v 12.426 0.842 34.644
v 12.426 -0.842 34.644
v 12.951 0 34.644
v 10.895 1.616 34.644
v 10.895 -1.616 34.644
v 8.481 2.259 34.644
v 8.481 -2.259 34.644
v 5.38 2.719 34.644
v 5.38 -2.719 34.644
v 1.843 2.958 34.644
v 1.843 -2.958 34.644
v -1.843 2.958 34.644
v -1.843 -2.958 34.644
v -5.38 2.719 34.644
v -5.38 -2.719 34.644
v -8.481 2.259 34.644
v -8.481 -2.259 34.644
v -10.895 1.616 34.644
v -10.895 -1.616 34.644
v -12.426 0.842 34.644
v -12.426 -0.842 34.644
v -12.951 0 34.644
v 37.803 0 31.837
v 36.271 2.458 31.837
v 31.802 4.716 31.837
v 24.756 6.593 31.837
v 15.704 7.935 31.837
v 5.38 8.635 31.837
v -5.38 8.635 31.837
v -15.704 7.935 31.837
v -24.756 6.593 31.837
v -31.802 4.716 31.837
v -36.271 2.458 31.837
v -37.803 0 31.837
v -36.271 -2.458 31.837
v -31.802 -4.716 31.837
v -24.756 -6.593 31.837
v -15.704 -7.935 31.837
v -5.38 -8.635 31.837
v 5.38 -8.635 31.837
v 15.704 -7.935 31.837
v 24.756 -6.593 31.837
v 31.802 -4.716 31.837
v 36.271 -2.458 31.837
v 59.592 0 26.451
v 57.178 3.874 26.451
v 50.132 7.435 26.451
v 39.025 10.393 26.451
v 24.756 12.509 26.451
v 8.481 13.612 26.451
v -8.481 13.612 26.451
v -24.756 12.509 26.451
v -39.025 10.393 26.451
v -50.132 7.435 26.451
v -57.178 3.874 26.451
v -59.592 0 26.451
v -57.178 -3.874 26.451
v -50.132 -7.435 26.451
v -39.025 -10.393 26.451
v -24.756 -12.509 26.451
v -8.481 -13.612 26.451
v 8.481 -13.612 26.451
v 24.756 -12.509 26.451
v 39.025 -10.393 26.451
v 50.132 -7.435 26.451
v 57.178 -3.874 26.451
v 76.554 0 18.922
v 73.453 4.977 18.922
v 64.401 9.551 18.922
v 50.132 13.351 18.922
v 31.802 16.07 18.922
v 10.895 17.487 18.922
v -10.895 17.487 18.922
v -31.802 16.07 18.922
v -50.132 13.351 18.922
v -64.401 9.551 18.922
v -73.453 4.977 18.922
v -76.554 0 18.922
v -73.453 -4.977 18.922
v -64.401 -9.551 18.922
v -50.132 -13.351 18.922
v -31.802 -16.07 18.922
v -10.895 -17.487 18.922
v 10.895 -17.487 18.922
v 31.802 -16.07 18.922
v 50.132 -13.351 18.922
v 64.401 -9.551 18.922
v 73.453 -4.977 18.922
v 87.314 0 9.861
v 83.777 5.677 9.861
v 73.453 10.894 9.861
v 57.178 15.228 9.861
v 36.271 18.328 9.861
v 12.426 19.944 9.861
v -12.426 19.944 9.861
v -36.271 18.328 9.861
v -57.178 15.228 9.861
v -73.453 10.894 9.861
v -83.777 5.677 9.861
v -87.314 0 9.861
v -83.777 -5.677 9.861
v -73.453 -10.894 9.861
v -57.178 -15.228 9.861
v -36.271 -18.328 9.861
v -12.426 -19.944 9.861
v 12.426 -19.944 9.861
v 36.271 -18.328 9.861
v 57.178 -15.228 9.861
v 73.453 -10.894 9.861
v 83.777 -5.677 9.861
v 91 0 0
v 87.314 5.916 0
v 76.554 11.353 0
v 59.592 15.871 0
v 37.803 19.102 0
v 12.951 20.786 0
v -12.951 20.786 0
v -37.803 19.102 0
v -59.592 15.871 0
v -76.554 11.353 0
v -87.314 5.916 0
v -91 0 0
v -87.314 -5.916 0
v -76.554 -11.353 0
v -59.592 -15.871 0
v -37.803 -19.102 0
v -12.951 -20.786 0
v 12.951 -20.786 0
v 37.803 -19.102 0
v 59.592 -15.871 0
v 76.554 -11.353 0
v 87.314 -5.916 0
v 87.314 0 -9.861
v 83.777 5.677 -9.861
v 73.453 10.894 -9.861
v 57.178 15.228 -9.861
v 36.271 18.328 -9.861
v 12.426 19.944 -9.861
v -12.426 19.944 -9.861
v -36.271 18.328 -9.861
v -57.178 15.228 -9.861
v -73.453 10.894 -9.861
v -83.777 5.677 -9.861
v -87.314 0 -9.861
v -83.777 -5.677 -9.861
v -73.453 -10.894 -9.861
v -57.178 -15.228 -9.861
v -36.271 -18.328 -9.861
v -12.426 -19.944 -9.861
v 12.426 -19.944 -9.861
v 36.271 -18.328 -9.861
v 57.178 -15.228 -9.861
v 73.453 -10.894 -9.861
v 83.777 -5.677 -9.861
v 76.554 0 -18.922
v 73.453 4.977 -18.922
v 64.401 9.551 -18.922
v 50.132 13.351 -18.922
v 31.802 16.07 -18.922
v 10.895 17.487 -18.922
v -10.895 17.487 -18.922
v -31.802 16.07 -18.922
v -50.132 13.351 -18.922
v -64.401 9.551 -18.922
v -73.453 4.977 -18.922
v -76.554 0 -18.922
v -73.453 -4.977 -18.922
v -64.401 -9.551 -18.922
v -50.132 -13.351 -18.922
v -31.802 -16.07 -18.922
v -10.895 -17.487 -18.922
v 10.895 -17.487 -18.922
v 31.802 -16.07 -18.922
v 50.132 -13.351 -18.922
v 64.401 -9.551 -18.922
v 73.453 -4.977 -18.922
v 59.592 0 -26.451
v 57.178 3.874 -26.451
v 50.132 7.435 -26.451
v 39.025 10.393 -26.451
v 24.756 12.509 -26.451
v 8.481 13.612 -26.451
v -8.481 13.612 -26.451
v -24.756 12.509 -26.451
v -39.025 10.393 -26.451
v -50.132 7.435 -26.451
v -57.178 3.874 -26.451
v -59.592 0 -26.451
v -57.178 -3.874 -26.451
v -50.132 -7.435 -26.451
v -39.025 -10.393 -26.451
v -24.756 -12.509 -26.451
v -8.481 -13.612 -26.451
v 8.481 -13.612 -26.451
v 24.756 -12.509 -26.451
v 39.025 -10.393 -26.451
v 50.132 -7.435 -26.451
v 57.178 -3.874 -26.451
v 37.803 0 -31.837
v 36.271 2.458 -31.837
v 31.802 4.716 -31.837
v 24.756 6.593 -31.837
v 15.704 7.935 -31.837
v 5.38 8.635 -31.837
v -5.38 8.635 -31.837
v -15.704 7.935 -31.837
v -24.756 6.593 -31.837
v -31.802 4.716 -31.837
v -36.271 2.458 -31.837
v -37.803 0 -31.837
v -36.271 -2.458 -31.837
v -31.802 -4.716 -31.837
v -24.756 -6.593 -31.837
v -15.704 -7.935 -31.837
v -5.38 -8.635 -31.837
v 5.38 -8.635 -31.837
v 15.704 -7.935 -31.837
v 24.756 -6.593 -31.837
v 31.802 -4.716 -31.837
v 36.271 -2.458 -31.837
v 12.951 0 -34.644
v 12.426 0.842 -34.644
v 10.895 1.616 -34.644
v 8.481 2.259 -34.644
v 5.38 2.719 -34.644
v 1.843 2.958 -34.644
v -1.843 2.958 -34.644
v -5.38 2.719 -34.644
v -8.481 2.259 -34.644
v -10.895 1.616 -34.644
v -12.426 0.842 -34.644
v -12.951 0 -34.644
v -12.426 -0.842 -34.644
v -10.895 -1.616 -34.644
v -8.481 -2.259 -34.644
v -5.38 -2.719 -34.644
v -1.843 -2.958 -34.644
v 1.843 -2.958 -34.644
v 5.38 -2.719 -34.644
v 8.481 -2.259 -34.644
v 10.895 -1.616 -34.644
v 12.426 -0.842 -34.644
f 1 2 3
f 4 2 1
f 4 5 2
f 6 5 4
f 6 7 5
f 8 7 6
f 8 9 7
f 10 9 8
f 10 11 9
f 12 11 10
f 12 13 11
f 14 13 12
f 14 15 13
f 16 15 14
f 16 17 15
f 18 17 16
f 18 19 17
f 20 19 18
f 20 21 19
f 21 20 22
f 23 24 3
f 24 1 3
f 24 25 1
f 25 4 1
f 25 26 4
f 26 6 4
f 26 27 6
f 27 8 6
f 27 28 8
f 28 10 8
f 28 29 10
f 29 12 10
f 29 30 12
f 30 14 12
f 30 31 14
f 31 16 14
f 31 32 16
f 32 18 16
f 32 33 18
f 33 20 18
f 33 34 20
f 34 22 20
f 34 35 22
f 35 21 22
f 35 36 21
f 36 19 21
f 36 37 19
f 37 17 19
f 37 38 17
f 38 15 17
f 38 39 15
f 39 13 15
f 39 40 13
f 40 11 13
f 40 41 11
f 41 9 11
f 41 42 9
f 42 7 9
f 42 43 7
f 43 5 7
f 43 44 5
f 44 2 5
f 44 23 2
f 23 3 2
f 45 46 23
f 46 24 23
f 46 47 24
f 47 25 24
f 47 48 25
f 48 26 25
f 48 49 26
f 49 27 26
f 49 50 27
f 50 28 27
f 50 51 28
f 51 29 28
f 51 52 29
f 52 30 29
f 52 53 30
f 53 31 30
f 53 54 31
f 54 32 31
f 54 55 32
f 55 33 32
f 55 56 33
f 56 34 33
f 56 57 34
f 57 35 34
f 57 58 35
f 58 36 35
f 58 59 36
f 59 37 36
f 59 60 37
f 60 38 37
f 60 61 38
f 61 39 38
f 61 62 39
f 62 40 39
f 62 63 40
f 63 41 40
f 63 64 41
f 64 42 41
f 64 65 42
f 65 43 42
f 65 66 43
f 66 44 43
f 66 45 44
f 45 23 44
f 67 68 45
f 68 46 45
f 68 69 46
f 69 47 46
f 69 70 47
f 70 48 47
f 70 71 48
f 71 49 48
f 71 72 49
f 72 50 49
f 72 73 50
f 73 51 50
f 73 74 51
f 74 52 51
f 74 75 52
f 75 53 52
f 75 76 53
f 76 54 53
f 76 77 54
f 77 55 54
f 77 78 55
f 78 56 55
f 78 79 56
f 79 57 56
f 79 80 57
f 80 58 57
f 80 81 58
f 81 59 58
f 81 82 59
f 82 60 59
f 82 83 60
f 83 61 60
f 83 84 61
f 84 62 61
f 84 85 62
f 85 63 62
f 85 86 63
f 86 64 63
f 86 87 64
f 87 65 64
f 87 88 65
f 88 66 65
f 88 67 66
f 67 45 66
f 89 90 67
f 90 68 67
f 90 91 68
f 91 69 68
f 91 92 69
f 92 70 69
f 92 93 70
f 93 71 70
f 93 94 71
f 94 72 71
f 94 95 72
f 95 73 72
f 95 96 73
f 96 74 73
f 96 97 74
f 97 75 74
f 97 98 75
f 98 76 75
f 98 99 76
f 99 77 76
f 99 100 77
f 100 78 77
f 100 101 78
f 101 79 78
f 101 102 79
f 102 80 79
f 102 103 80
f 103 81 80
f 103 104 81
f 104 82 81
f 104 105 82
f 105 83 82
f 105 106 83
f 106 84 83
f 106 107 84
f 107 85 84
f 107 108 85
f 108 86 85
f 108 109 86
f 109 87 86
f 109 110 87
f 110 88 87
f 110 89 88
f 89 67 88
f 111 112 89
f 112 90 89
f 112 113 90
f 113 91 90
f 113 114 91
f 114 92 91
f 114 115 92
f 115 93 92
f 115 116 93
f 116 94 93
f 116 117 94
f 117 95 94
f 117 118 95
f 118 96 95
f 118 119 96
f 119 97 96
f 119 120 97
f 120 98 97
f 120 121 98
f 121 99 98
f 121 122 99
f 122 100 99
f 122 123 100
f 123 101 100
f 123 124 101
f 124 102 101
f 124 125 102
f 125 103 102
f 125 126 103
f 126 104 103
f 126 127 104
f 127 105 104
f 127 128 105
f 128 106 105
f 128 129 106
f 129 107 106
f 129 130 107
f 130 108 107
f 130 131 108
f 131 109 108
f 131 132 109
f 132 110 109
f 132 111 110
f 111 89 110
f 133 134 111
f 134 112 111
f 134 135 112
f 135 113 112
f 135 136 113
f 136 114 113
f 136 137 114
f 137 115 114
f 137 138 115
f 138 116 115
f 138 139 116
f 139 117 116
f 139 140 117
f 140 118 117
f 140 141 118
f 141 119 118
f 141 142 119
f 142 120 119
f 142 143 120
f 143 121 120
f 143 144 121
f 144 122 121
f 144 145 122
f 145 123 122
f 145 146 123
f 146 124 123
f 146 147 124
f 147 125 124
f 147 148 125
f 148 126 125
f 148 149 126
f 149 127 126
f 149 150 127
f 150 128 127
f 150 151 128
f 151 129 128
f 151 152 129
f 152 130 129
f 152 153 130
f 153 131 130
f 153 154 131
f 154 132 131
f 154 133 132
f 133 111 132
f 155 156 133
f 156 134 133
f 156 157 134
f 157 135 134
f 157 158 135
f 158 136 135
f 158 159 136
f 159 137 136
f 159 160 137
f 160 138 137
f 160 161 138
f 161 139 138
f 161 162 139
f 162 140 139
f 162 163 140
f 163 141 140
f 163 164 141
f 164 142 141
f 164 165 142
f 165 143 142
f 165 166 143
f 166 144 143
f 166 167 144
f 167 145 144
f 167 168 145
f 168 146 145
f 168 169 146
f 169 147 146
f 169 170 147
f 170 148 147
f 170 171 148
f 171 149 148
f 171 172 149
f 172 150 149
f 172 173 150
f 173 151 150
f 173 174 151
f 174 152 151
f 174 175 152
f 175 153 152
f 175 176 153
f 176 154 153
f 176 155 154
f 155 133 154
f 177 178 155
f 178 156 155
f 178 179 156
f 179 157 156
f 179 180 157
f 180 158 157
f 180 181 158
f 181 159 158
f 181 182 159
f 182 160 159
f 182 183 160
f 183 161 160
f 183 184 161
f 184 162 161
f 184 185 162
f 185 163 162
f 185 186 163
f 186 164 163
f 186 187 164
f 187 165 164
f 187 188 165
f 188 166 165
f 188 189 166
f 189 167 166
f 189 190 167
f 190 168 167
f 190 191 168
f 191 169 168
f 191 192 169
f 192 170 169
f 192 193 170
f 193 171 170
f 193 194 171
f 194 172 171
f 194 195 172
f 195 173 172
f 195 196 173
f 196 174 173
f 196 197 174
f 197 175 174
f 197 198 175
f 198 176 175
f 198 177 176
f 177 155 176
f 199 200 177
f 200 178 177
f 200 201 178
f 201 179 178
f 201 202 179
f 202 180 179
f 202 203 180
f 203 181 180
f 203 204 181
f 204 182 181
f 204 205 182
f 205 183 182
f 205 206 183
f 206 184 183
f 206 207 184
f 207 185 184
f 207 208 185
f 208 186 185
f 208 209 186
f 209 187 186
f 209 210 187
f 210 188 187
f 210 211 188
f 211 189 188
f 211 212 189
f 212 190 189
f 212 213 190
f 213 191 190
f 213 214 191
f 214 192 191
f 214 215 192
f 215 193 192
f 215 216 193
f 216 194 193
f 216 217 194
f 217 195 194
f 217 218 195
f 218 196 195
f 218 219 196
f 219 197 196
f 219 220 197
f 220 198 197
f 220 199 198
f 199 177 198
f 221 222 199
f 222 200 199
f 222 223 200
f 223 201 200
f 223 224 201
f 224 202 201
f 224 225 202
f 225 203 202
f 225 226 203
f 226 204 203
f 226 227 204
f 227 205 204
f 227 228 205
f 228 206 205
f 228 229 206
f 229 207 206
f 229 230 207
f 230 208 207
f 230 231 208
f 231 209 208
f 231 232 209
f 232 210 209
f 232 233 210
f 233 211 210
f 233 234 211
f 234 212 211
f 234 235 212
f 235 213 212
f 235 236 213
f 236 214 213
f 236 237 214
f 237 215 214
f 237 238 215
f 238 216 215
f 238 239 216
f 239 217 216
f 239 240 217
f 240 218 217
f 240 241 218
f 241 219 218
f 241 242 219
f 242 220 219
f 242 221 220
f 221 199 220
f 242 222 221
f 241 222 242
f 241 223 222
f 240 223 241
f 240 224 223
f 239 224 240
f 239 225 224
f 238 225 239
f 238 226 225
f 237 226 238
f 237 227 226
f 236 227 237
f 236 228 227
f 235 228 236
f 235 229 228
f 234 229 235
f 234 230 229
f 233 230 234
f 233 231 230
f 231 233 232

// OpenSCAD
// Generated by SolidPython 1.0.1 on 2020-07-29 00:46:50


scale(v = [13, 3, 5]) {
	sphere(r = 7);
}
/***********************************************
*********      SolidPython code:      **********
************************************************
 
# import packages: SolidPython
from solid import *
from solid.utils import *
from itertools import chain, combinations, permutations


class Resize:

    def __init__(self, scad_file):
        self.scad_file = scad_file
        #self.scad_file = import_scad(scad_file)
        # cone/cylinder param:
        self.r1 = 0
        self.r2 = 0
        self.h = 0
        # rectangular prism param:
        self.w = 0
        self.l = 0
        # ellipse param:
        self.r = 0

    # import OpenScad code (file name corresponds to shape)


    # classify shape + parameters
    def assign(self, param1, param2, param3):
        if self.scad_file == 'cone.scad':
            self.r1 = param1
            self.r2 = param2
            self.h = param3
        elif self.scad_file == 'cylinder.scad':
            self.r1 = param1
            self.r2 = param2
            self.h = param3
        elif self.scad_file == 'rectangularPrism.scad':
            self.h = param1
            self.l = param2
            self.w = param3
        else:
            self.r = param1
            self.h = param2

    # resize parameters
    def iterate(self):
        x = range(3, 20, 2)
        i = 1
        if self.scad_file == 'cone.scad':
            tempList = list(permutations(x, 2))
            for temp in tempList:
                param1 = temp[0]
                param2 = temp[1]
                filepath = 'produced_scad_files/' + 'cone' + str(param1) + '_' + str(param2) + '_' + '.scad'
                scad_render_to_file(cylinder(h=param1, r1=param2, r2=0), filepath)

        elif self.scad_file == 'cylinder.scad':
            tempList = list(permutations(x, 3))
            for temp in tempList:
                param1 = temp[0]
                param2 = temp[1]
                filepath = 'produced_scad_files/' + 'cylinder' + str(param1) + '_' + str(param2) + '_' + '.scad'
                scad_render_to_file(cylinder(h=param1, r1=param2, r2=param2), filepath)

        elif self.scad_file == 'rectangularPrism.scad':
            tempList = list(permutations(x, 3))
            for temp in tempList:
                param1 = temp[0]
                param2 = temp[1]
                param3 = temp[2]
                filepath = 'produced_scad_files/' + 'rectangularPrism' + str(param1) + '_' + str(param2) + '_' + str(
                    param3) + '.scad'
                scad_render_to_file(cube(size=(param1, param2, param3)), filepath)

        elif self.scad_file == 'ellipse.scad':
            tempList = list(permutations(x, 4))
            for temp in tempList:
                param1 = temp[0]
                param2 = temp[1]
                param3 = temp[2]
                param4 = temp[3]
                filepath = 'produced_scad_files/' + 'ellipse' + str(param1) + '_' + str(param2) + '_' + str(param3) + '_' + str(param4) + '.scad'
                scad_render_to_file(scale([param1, param2, param3])(sphere(r=param4)), filepath)

    def render_to_scadfile(self):
        scad_render_to_file(scad, 'example.scad') 
 
************************************************/
